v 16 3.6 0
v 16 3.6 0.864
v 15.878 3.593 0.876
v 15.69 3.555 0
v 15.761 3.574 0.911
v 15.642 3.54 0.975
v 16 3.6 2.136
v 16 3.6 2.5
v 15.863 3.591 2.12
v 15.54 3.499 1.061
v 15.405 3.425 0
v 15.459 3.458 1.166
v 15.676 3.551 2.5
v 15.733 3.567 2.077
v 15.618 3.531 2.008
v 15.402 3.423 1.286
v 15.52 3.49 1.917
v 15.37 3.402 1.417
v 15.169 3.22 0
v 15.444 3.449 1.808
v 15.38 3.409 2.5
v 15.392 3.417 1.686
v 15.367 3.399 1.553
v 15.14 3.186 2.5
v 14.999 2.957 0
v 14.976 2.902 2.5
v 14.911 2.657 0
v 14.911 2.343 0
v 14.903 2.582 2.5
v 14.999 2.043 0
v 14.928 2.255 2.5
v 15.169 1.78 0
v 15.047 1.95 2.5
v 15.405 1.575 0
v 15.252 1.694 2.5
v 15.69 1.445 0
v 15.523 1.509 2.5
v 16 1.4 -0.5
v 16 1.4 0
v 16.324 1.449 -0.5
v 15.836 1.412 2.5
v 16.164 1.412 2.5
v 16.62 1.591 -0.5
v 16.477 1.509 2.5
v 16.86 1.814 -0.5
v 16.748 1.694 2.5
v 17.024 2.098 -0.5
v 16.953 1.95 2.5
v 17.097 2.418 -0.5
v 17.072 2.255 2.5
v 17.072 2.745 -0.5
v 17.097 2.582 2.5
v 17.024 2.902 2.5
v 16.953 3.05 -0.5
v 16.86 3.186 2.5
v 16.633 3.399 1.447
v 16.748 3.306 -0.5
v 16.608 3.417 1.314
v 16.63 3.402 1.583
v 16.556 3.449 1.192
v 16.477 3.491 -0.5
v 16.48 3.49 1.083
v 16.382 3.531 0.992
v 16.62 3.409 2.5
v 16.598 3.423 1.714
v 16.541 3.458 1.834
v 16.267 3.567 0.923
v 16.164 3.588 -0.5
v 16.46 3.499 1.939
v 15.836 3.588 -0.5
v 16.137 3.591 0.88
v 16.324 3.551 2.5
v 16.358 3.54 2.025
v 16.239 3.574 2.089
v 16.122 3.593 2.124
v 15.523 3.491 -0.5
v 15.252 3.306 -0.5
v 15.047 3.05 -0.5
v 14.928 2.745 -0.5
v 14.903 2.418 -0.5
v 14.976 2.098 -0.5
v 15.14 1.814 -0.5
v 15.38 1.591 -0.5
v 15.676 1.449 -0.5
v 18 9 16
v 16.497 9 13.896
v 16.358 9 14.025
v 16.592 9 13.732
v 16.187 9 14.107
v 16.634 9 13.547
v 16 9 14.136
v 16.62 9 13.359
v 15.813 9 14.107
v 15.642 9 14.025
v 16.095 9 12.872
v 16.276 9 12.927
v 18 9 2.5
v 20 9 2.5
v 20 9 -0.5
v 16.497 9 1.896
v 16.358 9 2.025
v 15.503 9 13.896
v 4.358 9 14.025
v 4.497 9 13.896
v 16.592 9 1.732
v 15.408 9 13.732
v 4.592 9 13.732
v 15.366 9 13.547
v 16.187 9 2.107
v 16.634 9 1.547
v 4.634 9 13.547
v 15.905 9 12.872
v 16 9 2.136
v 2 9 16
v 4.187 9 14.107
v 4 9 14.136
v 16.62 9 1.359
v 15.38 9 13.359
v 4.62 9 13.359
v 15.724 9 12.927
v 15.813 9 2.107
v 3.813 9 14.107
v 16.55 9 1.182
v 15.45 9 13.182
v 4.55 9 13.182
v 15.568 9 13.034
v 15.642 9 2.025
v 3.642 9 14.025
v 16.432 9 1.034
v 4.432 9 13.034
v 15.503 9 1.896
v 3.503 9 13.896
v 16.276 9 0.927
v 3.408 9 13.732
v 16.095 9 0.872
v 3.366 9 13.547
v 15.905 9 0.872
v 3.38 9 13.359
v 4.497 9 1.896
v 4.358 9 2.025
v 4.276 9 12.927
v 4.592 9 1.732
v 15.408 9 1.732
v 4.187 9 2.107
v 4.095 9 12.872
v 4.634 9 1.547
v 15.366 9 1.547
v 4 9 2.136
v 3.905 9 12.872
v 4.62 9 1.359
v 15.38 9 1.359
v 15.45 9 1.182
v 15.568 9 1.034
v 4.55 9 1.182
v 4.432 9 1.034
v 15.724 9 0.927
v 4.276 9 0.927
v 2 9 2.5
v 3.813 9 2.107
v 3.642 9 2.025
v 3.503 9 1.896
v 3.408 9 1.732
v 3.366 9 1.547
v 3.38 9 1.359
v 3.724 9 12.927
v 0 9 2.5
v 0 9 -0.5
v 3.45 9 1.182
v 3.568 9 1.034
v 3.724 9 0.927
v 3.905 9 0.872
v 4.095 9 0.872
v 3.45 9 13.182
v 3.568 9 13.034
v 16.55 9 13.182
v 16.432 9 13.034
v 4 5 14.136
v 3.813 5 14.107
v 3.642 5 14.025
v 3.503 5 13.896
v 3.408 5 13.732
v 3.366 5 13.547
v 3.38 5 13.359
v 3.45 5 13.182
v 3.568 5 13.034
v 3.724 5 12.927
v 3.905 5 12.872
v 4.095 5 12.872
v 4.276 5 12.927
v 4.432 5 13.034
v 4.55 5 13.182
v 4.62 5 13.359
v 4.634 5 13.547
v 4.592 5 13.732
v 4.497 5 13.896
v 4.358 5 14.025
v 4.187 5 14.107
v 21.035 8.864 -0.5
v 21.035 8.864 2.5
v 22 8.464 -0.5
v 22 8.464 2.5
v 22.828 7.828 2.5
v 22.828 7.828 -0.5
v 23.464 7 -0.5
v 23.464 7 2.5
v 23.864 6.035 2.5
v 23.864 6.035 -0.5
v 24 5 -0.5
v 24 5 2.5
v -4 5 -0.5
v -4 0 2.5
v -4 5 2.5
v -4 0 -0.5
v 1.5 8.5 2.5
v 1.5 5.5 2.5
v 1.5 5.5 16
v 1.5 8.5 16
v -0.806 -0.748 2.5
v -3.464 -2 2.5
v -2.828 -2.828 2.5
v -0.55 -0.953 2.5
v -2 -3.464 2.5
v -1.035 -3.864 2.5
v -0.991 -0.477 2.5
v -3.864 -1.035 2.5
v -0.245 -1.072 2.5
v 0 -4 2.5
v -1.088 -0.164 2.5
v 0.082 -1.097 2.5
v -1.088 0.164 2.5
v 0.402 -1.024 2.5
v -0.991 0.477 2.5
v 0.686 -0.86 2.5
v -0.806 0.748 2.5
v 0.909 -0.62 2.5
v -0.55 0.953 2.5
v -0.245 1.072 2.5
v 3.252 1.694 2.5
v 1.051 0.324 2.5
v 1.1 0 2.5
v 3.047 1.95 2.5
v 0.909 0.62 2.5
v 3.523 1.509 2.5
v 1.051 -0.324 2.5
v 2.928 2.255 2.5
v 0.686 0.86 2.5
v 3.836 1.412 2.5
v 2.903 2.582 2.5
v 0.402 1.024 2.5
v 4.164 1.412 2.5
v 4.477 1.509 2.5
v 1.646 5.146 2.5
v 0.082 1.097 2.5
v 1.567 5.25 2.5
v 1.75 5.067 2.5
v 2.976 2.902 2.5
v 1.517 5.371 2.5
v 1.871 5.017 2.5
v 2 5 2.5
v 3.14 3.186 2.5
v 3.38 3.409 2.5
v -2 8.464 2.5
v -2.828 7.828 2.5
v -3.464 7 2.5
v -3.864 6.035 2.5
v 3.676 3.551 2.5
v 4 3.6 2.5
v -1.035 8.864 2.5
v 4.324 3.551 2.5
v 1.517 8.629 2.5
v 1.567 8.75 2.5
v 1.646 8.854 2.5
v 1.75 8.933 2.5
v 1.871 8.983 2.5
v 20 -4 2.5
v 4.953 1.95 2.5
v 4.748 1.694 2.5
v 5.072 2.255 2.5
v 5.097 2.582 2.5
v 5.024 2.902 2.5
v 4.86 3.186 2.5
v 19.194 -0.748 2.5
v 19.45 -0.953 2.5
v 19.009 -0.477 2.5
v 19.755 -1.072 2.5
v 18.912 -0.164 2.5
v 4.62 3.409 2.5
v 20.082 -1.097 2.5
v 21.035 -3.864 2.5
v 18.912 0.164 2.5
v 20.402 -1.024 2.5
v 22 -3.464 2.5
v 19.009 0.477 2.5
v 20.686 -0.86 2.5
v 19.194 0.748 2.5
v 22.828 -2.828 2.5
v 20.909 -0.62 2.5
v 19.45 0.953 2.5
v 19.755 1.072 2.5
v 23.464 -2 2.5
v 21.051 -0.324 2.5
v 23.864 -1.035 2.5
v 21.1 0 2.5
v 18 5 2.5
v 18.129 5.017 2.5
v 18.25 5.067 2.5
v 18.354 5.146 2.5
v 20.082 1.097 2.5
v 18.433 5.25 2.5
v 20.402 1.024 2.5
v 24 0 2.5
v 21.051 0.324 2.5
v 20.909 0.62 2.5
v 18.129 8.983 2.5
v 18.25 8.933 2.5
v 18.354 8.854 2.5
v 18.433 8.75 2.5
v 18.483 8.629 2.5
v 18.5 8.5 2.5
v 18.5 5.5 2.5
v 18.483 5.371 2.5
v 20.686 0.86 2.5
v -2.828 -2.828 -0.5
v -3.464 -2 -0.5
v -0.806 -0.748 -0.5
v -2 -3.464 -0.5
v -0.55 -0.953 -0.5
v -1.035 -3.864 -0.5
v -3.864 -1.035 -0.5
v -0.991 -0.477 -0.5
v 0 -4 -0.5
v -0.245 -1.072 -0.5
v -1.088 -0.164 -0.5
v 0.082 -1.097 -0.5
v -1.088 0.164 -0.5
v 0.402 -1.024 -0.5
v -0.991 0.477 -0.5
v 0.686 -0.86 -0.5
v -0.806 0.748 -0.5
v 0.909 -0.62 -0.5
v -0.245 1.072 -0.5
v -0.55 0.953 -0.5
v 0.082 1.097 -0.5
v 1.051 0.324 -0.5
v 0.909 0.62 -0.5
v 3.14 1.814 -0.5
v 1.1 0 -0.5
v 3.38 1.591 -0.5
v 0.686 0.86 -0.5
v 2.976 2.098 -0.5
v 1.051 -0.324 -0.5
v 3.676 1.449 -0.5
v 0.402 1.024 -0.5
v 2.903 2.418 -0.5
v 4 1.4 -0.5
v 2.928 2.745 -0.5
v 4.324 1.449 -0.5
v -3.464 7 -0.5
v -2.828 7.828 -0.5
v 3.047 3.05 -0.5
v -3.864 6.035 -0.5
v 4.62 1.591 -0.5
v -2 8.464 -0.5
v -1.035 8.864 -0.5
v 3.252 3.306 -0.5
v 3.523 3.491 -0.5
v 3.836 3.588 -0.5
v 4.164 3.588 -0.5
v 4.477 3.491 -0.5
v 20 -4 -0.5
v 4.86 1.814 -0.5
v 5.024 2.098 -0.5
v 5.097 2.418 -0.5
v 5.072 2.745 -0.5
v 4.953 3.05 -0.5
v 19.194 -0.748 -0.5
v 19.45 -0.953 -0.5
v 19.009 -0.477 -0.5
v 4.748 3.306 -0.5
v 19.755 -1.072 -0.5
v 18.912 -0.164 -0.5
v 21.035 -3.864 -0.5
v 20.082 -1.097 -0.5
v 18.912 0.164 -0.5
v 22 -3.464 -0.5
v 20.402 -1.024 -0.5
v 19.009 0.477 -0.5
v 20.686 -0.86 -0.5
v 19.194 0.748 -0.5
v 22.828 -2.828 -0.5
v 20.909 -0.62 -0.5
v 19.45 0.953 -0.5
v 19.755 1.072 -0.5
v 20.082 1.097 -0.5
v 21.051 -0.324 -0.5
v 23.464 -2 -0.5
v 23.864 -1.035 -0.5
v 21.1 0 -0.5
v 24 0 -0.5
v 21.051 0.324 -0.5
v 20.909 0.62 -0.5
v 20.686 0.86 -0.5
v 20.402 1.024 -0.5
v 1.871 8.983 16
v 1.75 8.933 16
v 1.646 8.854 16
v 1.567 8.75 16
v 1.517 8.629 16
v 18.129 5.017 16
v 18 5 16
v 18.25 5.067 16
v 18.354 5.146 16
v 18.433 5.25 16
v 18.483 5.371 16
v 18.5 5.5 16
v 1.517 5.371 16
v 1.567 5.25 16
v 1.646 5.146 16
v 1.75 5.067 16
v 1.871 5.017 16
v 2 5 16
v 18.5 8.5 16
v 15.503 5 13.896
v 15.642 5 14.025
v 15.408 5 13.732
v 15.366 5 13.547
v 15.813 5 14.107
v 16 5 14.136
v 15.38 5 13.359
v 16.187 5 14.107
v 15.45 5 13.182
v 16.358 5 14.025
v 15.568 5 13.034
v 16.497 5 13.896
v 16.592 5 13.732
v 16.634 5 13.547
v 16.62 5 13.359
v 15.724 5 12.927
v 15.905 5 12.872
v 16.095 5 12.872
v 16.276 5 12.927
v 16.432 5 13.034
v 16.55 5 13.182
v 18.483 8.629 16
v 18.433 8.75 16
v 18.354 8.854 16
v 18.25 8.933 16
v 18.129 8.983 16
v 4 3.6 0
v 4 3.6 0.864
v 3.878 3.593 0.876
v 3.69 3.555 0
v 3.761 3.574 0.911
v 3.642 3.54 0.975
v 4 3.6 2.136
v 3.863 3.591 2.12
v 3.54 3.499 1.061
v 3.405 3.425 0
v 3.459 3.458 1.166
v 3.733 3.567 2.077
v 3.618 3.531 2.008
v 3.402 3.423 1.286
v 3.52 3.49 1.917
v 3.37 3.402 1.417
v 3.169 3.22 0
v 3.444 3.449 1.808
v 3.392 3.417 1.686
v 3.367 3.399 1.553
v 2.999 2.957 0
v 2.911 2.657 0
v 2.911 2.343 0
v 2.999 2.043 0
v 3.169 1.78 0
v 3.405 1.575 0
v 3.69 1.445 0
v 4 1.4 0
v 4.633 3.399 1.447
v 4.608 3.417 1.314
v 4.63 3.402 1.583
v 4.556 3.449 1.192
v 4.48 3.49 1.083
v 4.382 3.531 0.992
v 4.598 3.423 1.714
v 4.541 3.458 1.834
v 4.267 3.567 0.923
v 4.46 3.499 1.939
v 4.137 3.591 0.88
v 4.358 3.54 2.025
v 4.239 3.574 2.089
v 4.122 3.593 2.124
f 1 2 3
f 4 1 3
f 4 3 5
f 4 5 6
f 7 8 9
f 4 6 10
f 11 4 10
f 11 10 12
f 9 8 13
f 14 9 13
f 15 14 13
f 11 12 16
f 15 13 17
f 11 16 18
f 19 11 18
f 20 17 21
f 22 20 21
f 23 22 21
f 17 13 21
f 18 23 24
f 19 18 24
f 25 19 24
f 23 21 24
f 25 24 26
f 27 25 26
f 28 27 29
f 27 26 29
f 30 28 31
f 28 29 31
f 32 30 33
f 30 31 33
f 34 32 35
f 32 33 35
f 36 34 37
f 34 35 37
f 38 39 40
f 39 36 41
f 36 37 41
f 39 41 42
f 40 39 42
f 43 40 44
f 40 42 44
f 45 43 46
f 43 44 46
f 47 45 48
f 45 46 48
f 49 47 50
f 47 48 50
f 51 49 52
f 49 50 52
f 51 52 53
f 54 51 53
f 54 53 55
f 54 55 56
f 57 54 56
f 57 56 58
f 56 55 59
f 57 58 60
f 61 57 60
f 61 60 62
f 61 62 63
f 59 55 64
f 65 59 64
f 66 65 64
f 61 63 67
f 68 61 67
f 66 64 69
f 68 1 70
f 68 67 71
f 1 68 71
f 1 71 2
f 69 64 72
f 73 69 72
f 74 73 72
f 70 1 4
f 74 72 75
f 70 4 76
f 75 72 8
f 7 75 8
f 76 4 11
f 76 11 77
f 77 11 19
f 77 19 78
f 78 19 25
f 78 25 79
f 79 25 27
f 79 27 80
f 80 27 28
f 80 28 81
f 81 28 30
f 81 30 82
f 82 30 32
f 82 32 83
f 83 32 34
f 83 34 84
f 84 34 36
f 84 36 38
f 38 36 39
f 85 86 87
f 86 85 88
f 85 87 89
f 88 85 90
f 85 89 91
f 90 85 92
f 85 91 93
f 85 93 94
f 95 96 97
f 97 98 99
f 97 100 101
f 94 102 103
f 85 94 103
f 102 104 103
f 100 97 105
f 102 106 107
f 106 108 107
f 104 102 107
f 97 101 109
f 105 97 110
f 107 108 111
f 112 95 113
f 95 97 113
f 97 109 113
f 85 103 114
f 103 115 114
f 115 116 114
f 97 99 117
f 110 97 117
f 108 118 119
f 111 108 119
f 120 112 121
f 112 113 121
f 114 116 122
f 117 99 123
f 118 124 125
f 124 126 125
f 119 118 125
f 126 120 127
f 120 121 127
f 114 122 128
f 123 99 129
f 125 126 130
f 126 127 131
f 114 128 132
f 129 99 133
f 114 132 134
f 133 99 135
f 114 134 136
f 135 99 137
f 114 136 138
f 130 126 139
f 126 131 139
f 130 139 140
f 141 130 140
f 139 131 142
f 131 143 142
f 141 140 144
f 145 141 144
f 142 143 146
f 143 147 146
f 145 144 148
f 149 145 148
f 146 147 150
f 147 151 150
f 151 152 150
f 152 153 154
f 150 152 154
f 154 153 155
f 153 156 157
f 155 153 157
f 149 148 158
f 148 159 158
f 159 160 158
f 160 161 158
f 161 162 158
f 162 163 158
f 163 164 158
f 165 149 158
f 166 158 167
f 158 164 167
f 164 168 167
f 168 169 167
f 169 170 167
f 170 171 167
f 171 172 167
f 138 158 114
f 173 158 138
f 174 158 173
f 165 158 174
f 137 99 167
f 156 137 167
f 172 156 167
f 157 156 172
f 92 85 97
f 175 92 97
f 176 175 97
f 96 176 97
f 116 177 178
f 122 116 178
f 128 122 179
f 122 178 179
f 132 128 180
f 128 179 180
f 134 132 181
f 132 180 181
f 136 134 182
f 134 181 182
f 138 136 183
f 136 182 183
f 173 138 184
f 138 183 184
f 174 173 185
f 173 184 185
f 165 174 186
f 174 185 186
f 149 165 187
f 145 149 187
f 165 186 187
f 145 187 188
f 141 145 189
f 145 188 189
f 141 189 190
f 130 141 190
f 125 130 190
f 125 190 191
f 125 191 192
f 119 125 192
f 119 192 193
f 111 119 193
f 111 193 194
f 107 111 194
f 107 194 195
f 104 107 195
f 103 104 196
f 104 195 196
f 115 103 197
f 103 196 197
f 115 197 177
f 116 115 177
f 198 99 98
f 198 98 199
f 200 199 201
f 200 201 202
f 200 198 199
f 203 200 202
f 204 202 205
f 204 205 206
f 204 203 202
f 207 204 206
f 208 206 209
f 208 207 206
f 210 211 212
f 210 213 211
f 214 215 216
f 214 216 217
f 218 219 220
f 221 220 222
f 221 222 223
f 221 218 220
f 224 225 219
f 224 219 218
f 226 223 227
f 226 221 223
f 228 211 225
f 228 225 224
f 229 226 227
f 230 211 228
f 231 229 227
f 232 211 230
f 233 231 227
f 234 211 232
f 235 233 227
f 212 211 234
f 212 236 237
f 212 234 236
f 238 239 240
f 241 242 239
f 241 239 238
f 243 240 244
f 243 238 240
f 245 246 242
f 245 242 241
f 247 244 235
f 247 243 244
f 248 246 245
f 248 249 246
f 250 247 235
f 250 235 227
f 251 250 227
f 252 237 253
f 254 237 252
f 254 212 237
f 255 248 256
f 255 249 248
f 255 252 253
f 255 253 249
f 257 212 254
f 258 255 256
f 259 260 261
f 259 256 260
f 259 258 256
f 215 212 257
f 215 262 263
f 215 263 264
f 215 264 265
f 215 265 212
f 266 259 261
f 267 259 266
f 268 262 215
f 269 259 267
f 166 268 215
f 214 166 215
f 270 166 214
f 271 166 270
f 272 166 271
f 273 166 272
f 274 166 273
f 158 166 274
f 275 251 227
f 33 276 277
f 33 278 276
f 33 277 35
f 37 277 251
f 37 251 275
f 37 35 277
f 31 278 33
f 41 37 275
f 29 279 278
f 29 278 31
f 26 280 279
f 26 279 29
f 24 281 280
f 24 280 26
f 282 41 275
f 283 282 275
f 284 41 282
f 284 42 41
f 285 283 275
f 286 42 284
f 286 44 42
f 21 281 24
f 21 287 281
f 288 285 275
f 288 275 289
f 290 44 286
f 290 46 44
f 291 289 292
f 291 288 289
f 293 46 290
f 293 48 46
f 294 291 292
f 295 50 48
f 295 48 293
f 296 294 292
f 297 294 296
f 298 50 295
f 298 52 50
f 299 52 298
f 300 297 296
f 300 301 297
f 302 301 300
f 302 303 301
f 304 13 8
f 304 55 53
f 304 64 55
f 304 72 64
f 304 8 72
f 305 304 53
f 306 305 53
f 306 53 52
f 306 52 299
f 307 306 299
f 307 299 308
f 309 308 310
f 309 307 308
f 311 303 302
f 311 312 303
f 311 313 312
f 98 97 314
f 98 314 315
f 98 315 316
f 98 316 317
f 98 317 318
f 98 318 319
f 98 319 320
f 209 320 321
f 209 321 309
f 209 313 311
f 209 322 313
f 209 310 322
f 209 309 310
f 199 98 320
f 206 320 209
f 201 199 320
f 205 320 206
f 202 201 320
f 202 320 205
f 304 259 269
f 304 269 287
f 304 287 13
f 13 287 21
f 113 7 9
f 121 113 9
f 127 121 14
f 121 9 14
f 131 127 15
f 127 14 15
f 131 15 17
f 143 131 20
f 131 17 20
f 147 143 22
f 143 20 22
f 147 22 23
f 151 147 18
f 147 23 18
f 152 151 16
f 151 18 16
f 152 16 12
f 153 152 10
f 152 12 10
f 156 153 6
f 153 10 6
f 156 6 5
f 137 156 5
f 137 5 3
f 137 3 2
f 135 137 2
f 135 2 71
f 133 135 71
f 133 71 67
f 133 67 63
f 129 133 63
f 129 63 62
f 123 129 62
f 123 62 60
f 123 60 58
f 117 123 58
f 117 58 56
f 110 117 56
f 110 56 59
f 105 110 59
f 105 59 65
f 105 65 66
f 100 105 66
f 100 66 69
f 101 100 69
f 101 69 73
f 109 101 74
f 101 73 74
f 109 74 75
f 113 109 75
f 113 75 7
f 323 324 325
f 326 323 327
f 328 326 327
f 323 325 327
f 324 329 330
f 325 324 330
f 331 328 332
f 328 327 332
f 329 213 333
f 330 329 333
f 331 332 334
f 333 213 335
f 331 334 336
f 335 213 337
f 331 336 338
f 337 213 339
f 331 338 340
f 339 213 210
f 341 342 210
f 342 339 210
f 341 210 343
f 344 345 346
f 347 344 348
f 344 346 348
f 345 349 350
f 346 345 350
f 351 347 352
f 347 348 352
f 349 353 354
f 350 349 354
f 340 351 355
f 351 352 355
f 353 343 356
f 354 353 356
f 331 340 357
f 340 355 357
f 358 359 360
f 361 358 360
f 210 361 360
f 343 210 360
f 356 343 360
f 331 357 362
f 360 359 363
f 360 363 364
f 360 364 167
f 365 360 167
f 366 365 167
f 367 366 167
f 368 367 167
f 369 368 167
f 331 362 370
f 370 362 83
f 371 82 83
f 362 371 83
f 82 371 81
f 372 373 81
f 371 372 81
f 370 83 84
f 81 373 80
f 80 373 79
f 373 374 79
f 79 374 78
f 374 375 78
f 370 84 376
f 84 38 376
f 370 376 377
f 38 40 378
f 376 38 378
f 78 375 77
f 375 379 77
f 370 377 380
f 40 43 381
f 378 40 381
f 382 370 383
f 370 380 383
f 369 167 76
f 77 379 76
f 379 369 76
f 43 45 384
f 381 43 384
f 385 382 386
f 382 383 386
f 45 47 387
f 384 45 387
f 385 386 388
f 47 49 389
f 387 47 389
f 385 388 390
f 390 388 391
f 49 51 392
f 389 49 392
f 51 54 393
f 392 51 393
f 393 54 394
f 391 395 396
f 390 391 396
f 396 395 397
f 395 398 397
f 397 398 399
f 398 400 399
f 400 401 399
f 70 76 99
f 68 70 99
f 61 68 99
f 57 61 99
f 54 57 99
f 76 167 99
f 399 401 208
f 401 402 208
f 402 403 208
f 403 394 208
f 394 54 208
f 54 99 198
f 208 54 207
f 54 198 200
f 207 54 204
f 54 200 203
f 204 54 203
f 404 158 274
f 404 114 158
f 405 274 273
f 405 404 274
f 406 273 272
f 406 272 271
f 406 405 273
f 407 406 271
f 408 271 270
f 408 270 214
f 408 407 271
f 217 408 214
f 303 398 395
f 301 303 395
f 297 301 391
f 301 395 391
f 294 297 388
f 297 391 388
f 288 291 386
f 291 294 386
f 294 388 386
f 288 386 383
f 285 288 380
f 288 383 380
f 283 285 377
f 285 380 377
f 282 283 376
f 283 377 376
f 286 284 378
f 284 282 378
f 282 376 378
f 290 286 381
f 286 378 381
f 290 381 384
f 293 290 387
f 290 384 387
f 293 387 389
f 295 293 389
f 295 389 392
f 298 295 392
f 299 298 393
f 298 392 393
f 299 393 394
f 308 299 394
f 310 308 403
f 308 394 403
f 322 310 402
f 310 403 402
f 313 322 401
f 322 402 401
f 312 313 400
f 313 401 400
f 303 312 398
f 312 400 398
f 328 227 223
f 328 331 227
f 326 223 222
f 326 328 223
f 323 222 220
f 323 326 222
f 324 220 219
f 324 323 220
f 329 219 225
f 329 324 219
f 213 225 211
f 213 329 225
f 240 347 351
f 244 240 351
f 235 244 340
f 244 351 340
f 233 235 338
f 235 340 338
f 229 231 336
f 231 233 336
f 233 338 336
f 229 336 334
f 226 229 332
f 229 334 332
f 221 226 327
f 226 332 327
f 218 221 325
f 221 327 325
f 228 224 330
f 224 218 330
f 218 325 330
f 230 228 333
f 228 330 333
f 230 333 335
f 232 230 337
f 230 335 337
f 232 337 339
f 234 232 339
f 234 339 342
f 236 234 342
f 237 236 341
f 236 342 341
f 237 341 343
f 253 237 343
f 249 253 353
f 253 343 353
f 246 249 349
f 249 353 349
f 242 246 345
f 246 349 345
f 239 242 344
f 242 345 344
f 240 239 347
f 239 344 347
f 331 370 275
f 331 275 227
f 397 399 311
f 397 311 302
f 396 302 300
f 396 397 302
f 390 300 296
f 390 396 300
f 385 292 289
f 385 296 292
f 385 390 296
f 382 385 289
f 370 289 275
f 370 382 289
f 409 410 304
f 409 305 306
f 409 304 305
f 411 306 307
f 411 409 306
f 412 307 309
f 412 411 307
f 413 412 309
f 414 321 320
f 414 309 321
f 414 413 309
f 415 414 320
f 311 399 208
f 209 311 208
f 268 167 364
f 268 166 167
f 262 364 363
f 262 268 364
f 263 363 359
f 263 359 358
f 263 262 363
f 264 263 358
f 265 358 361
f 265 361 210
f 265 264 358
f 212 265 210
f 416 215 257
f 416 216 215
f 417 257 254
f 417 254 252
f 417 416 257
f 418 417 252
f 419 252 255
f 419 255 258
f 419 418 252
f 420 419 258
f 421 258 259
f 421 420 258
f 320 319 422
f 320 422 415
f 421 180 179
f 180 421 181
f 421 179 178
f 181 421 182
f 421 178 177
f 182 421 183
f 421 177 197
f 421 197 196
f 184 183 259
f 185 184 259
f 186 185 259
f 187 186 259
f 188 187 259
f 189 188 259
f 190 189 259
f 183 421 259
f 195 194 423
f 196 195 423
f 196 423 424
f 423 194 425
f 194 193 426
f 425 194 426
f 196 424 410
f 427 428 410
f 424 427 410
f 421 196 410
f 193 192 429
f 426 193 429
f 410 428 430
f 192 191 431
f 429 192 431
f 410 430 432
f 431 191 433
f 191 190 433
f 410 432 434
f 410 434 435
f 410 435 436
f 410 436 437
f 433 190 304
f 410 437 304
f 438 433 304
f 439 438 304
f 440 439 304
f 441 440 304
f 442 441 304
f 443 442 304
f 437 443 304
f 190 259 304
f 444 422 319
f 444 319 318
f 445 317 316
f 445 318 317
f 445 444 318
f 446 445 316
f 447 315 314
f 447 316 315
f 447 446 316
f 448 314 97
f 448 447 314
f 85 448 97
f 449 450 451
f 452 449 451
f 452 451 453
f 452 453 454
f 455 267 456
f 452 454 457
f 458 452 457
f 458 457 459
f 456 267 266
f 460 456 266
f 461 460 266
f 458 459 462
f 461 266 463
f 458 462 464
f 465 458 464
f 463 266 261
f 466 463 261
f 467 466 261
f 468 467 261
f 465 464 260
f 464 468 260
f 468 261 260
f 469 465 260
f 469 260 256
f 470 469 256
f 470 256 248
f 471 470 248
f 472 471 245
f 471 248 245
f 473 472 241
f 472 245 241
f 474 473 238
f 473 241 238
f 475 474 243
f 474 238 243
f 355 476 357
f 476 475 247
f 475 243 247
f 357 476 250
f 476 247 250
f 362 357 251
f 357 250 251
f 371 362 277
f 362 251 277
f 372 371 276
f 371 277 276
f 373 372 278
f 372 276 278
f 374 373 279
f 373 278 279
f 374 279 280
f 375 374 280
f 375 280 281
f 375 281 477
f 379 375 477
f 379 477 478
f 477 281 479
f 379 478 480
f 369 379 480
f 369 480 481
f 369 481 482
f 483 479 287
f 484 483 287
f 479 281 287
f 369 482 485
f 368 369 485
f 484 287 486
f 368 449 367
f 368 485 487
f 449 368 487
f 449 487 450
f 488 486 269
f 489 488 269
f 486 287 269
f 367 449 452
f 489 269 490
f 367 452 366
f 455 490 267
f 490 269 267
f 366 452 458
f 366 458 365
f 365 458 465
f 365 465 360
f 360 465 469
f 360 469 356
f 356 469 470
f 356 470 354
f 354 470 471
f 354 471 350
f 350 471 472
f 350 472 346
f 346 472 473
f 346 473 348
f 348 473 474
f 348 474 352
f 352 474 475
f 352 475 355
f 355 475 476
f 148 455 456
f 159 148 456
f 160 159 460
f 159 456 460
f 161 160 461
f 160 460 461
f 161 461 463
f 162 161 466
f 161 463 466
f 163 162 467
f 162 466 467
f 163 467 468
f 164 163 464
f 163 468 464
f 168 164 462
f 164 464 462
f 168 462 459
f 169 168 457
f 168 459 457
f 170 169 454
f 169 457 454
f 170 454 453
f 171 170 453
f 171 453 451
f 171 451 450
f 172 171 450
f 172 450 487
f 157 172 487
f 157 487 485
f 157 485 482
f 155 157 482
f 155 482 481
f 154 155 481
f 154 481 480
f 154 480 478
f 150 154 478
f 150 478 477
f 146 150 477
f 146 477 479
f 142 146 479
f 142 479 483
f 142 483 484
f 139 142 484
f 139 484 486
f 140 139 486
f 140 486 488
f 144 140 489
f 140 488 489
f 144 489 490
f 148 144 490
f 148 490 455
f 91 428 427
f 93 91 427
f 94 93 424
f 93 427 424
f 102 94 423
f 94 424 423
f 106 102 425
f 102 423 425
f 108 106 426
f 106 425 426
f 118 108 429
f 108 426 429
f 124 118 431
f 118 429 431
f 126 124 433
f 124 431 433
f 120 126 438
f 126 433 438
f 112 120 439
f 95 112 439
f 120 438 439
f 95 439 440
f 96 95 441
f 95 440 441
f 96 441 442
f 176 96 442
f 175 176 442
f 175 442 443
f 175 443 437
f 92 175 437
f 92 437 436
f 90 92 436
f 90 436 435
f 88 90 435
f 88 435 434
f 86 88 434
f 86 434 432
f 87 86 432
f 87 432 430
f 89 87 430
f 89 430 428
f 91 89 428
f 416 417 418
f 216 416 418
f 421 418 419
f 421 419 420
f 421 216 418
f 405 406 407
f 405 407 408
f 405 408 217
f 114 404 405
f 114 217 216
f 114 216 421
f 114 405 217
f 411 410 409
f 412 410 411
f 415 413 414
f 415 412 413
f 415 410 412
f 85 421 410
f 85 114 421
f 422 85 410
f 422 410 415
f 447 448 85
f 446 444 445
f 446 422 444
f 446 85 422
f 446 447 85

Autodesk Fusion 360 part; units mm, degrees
sketch "Sketch2" plane through (0, 0, 0) normal (0, 0, 1) x (1, 0, 0)
  arc A0 (18.5, 20) -> (18, 20.5) centre (18, 20) ccw
  line L0 (18.5, 20) -> (18.5, 8.6168)
  arc A1 (18.5, 8.6168) -> (21.6842, 3.6281) centre (24, 8.6168) ccw
  arc A2 (20, -4) -> (21.6842, 3.6281) centre (20, 0) ccw
  line L1 (20, -4) -> (0, -4)
  arc A3 (-1.6842, 3.6281) -> (0, -4) centre (0, 0) ccw
  arc A4 (-1.6842, 3.6281) -> (1.5, 8.6168) centre (-4, 8.6168) ccw
  line L2 (1.5, 8.6168) -> (1.5, 20)
  arc A5 (2, 20.5) -> (1.5, 20) centre (2, 20) ccw
  line L3 (2, 20.5) -> (18, 20.5)
  circle A6 centre (20, 0) radius 1.1
  circle A7 centre (0, 0) radius 1.1
  line L4 (24, 9) -> (-4, 9)
  line L5 (-4, 0) -> (-4, 9)
  line L6 (24, 0) -> (24, 9)
  line L7 (1.5, 9) -> (1.5, 5)
  line L8 (1.5, 5) -> (18.5, 5)
  line L9 (18.5, 5) -> (18.5, 9)
  line L10 (10, -4) -> (10, 20.5) construction
  point P0 (4, 2.5)
  point P1 (16, 2.5)
  dimension "d2" = 9
  dimension "d6" = 4
  dimension "d20" = 12
  dimension "d21" = 2.5
ref_plane "WorkPlane1" through (0, 9, 0) normal (0, 1, 0) x (0, 0, 1)
sketch "Sketch3" plane through (0, 9, 0) normal (0, 1, 0) x (1, 0, 0)
  circle A0 centre (4, -13.5) radius 0.625
  circle A1 centre (4, -13.5) radius 0.625
  circle A2 centre (16, -13.5) radius 0.625
  circle A3 centre (16, -13.5) radius 0.625
  circle A4 centre (16, -1.5) radius 0.625
  circle A5 centre (16, -1.5) radius 0.625
  circle A6 centre (4, -1.5) radius 0.625
  circle A7 centre (4, -1.5) radius 0.625
  dimension "d4" = 12
  dimension "d5" = 12
extrude "Extrude1" add sketch "Sketch2" along normal blind 2.5 and the other way blind 0.5 contours L0 A1 A2 L4 L6 L9 | L0 L2 L4 L7 L8 L9 | A1 A2 L1 A3 A4 L7 L8 L9 | A3 A4 L2 L4 L5 L7
extrude "Extrude2" add sketch "Sketch2" along normal blind 16 contours L0 L2 L4 L7 L8 L9
hole "Hole1" at (4, 9, 13.5) at (16, 9, 13.5) at (16, 9, 1.5) at (4, 9, 1.5) direction (0, -1, 0) diameter 1.271 depth 6.5 tip angle 118
thread "Thread1" "ISO Metric profile 1.6 M1.6x0.35 6H"
fillet "Fillet1" radius 4 2 edges at (24, 9, 1) (-4, 9, 1)
fillet "Fillet1" radius 0.5 4 edges at (18.5, 9, 9.25) (1.5, 9, 9.25) (18.5, 5, 9.25) (1.5, 5, 9.25)
hole "Hole2" at (16, 2.5, 0) at (4, 2.5, 0) direction (0, 0, 1) diameter 2.2 depth 11 tip angle 118
hole "Hole3" at (16, 2.5, 0) at (4, 2.5, 0) direction (0, 0, -1) diameter 2.2 depth 11 tip angle 118
